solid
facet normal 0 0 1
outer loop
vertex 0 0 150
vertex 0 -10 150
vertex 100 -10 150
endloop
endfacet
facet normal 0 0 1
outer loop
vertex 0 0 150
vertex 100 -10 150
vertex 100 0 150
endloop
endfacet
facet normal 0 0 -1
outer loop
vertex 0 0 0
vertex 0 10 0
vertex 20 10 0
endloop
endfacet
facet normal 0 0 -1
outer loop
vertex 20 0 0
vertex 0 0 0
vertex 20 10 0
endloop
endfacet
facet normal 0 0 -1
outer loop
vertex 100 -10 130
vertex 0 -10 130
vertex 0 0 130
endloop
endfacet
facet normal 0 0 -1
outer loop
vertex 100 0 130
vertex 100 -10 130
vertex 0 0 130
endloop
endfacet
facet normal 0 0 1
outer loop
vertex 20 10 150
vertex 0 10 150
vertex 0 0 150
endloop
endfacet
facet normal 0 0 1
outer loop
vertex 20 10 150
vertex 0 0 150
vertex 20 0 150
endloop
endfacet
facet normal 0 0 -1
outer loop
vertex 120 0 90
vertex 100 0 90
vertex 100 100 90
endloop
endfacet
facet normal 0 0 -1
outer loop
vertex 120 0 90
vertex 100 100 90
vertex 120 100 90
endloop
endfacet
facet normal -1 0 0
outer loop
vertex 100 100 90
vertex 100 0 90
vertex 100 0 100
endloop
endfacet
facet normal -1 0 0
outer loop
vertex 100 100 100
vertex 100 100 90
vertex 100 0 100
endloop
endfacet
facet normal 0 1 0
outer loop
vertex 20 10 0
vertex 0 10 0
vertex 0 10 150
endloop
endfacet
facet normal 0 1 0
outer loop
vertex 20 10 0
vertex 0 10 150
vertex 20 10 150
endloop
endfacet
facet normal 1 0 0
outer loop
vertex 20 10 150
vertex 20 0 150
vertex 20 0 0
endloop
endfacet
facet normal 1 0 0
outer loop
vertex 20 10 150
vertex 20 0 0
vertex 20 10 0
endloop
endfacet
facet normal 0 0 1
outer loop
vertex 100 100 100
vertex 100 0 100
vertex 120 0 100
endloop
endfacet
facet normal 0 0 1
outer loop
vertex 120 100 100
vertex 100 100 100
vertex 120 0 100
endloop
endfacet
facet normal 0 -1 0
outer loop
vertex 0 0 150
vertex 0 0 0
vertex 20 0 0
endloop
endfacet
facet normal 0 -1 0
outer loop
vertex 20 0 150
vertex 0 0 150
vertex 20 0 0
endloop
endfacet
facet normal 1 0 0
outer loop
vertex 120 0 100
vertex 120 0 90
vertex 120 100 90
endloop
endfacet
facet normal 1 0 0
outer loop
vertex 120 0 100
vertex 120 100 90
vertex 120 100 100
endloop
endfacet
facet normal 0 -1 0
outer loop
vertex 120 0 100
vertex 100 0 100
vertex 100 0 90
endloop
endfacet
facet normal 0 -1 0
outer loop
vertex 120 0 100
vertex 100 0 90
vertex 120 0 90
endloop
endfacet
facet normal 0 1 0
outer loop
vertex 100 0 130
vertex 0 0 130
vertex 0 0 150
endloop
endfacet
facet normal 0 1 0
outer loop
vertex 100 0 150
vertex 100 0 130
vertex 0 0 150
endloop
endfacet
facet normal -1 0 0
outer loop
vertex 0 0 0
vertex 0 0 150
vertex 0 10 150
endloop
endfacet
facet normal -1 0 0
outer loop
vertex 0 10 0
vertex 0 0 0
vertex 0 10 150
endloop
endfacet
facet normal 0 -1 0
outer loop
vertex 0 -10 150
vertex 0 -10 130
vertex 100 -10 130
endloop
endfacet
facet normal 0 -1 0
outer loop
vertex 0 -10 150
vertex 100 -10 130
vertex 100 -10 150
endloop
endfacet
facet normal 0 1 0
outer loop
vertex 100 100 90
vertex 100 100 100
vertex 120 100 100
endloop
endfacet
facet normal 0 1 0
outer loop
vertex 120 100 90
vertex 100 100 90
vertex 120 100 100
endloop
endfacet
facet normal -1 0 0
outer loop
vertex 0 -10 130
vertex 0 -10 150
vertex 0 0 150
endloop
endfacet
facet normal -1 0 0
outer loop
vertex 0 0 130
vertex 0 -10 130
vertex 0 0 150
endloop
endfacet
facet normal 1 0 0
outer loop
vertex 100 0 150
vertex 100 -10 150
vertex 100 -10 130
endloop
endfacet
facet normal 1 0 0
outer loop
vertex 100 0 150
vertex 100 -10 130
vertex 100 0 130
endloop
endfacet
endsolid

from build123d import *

# Parameters (mm, degrees)
F0_W     = 20
F0_H     = 10
F3_DEPTH = 150
F1_W     = 10
F1_H     = 20
F4_DEPTH = 100
F2_W     = 20
F2_H     = 10
F5_DEPTH = 100


with BuildPart() as f3:
    # F0 (on Top) → F3 (new body, through all)
    with BuildSketch(Plane.XY):
        with Locations((10, 5)):
            Rectangle(F0_W, F0_H)
    extrude(amount=F3_DEPTH)


with BuildPart() as f4:
    # F1 (on Right) → F4 (new body, through all)
    with BuildSketch(Plane.YZ):
        with Locations((-5, 140)):
            Rectangle(F1_W, F1_H)
    extrude(amount=F4_DEPTH)


with BuildPart() as f5:
    # F2 (on Front) → F5 (new body, through all)
    with BuildSketch(Plane.XZ):
        with Locations((110, 95)):
            Rectangle(F2_W, F2_H)
    extrude(amount=-F5_DEPTH)


solid = Compound([f3.part, f4.part, f5.part])
